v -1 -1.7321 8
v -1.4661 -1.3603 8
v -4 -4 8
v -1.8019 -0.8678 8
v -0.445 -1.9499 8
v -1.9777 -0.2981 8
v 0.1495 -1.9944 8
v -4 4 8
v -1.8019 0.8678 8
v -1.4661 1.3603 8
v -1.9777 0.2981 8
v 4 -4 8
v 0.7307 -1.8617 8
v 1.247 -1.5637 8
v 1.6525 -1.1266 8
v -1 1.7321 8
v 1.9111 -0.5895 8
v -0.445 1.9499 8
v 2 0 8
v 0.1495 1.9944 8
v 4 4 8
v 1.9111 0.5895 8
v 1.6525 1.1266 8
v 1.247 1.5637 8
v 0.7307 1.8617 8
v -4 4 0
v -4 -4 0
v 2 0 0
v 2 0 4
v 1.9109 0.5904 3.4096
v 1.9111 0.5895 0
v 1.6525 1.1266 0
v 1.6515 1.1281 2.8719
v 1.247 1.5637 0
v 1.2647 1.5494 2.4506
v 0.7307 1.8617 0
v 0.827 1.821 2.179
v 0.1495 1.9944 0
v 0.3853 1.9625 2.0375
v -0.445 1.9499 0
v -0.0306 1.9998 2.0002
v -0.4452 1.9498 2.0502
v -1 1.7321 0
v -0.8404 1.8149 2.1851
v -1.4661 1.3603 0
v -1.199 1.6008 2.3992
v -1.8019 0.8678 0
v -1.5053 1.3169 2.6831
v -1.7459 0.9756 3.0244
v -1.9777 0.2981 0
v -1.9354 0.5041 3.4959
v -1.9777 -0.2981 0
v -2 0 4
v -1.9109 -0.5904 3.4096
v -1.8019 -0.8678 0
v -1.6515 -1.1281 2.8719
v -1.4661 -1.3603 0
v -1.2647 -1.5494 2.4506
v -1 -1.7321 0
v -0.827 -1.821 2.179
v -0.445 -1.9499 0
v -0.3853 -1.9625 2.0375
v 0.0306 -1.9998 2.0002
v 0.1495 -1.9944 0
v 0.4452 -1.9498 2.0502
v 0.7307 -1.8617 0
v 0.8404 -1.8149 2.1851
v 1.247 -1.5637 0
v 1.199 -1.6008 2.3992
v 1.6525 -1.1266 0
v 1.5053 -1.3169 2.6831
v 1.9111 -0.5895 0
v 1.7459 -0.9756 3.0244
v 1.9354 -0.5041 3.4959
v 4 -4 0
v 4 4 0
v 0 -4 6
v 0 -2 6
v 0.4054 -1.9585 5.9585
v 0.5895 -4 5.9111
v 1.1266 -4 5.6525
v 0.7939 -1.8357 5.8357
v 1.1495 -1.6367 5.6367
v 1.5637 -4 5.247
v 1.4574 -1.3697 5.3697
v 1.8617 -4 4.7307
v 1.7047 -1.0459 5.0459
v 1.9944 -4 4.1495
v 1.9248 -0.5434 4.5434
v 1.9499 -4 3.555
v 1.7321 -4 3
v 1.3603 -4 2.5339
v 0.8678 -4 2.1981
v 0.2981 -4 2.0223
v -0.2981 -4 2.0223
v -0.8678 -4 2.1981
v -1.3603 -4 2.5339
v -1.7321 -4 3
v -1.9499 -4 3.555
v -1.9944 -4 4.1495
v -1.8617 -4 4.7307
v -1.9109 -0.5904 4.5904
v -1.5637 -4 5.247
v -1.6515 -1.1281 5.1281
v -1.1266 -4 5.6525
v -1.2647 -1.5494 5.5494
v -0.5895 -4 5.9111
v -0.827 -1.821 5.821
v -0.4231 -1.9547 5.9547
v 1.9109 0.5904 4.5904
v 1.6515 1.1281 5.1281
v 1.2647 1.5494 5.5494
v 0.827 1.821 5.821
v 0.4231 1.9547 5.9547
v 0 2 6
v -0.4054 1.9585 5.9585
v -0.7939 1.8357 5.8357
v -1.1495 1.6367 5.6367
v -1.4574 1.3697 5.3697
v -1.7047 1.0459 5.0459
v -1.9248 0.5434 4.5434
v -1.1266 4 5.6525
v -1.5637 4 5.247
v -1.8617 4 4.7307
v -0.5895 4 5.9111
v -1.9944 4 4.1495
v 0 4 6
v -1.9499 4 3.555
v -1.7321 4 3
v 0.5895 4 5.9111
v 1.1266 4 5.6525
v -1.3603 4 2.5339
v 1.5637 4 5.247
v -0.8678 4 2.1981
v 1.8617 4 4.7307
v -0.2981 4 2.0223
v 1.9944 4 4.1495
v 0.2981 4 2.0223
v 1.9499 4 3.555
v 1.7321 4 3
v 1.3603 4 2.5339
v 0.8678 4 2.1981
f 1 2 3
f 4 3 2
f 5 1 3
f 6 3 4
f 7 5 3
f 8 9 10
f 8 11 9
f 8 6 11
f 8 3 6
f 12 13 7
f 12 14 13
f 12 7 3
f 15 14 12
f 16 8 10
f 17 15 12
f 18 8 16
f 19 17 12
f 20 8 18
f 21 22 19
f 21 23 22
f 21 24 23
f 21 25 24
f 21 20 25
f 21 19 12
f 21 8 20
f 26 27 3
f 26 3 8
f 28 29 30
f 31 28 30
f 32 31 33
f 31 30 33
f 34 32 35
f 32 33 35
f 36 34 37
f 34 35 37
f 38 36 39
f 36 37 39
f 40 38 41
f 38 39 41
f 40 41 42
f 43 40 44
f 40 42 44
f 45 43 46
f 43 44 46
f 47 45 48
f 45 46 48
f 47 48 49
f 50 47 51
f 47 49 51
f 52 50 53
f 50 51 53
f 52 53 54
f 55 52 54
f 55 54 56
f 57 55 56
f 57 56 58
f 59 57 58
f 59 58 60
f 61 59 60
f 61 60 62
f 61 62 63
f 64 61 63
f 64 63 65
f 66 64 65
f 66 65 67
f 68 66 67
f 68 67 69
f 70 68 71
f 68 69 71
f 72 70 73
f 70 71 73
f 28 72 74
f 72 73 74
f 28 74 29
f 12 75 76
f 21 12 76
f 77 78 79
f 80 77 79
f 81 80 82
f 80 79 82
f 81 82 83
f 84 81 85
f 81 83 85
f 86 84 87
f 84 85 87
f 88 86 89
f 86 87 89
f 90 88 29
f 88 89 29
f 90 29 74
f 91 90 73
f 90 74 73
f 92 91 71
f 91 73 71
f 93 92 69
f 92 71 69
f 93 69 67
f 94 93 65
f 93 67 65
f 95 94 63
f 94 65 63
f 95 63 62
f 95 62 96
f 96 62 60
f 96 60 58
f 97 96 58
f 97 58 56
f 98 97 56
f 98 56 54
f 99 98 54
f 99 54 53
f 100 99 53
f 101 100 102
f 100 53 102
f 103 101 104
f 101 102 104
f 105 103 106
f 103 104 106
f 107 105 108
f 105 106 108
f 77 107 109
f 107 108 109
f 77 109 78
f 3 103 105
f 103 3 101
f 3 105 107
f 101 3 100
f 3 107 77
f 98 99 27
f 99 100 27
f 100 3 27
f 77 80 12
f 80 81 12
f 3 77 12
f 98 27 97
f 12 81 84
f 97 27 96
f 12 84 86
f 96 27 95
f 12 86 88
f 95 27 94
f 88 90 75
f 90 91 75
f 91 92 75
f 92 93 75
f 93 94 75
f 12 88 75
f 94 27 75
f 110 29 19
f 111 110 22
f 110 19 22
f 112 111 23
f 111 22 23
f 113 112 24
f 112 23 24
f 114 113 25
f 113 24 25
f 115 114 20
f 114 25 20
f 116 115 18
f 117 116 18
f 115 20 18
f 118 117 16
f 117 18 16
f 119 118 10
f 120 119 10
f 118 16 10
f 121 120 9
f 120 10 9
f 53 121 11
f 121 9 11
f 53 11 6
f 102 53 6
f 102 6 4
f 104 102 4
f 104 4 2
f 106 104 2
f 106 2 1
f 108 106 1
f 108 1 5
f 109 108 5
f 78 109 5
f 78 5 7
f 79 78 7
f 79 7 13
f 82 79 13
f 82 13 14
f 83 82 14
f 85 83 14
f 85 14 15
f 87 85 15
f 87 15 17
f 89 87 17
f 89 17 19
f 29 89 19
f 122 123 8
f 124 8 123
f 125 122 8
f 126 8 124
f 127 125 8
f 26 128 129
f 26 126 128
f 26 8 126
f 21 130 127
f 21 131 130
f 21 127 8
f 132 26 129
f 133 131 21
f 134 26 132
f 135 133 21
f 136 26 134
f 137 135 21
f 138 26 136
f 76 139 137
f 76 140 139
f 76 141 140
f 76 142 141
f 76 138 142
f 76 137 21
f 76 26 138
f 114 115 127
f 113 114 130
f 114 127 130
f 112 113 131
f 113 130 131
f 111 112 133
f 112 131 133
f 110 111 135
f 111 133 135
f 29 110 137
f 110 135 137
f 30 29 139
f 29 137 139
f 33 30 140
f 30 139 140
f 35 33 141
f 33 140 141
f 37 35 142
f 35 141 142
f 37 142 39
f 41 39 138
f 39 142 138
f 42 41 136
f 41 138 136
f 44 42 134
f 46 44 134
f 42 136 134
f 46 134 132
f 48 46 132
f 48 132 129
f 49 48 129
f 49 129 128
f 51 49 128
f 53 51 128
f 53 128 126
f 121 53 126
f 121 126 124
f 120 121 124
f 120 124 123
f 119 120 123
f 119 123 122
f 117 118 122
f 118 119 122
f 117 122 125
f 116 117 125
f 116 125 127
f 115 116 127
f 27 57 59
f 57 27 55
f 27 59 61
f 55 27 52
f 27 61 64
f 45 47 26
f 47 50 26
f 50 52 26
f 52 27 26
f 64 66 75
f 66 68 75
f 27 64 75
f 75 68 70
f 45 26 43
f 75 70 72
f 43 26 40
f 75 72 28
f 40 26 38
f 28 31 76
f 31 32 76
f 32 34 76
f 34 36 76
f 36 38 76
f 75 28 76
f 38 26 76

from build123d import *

# Parameters (mm, degrees)
SKETCH_1_W          = 8
SKETCH_1_H          = 8
EXTRUDE_1_DEPTH     = 8
SKETCH_2_R          = 2
CUT_EXTRUDE_1_DEPTH = 22
SKETCH_3_R          = 2
CUT_EXTRUDE_2_DEPTH = 22


with BuildPart() as part:
    # 草图1 → 拉伸1 (new body)
    with BuildSketch(Plane.XY):
        Rectangle(SKETCH_1_W, SKETCH_1_H)
    extrude(amount=EXTRUDE_1_DEPTH)

    # 草图2 → 切除-拉伸1 (cut)
    with BuildSketch(Plane.XY.offset(8)):
        Circle(SKETCH_2_R)
    extrude(amount=-CUT_EXTRUDE_1_DEPTH, mode=Mode.SUBTRACT)

    # 草图3 → 切除-拉伸2 (cut)
    with BuildSketch(Plane(origin=(0, 4, 0), x_dir=(-1, 0, 0), z_dir=(0, 1, 0))):
        with Locations(Location((0, 4, 0), (0, 0, 90))):
            Circle(SKETCH_3_R)
    extrude(amount=-CUT_EXTRUDE_2_DEPTH, mode=Mode.SUBTRACT)


solid = part.part
